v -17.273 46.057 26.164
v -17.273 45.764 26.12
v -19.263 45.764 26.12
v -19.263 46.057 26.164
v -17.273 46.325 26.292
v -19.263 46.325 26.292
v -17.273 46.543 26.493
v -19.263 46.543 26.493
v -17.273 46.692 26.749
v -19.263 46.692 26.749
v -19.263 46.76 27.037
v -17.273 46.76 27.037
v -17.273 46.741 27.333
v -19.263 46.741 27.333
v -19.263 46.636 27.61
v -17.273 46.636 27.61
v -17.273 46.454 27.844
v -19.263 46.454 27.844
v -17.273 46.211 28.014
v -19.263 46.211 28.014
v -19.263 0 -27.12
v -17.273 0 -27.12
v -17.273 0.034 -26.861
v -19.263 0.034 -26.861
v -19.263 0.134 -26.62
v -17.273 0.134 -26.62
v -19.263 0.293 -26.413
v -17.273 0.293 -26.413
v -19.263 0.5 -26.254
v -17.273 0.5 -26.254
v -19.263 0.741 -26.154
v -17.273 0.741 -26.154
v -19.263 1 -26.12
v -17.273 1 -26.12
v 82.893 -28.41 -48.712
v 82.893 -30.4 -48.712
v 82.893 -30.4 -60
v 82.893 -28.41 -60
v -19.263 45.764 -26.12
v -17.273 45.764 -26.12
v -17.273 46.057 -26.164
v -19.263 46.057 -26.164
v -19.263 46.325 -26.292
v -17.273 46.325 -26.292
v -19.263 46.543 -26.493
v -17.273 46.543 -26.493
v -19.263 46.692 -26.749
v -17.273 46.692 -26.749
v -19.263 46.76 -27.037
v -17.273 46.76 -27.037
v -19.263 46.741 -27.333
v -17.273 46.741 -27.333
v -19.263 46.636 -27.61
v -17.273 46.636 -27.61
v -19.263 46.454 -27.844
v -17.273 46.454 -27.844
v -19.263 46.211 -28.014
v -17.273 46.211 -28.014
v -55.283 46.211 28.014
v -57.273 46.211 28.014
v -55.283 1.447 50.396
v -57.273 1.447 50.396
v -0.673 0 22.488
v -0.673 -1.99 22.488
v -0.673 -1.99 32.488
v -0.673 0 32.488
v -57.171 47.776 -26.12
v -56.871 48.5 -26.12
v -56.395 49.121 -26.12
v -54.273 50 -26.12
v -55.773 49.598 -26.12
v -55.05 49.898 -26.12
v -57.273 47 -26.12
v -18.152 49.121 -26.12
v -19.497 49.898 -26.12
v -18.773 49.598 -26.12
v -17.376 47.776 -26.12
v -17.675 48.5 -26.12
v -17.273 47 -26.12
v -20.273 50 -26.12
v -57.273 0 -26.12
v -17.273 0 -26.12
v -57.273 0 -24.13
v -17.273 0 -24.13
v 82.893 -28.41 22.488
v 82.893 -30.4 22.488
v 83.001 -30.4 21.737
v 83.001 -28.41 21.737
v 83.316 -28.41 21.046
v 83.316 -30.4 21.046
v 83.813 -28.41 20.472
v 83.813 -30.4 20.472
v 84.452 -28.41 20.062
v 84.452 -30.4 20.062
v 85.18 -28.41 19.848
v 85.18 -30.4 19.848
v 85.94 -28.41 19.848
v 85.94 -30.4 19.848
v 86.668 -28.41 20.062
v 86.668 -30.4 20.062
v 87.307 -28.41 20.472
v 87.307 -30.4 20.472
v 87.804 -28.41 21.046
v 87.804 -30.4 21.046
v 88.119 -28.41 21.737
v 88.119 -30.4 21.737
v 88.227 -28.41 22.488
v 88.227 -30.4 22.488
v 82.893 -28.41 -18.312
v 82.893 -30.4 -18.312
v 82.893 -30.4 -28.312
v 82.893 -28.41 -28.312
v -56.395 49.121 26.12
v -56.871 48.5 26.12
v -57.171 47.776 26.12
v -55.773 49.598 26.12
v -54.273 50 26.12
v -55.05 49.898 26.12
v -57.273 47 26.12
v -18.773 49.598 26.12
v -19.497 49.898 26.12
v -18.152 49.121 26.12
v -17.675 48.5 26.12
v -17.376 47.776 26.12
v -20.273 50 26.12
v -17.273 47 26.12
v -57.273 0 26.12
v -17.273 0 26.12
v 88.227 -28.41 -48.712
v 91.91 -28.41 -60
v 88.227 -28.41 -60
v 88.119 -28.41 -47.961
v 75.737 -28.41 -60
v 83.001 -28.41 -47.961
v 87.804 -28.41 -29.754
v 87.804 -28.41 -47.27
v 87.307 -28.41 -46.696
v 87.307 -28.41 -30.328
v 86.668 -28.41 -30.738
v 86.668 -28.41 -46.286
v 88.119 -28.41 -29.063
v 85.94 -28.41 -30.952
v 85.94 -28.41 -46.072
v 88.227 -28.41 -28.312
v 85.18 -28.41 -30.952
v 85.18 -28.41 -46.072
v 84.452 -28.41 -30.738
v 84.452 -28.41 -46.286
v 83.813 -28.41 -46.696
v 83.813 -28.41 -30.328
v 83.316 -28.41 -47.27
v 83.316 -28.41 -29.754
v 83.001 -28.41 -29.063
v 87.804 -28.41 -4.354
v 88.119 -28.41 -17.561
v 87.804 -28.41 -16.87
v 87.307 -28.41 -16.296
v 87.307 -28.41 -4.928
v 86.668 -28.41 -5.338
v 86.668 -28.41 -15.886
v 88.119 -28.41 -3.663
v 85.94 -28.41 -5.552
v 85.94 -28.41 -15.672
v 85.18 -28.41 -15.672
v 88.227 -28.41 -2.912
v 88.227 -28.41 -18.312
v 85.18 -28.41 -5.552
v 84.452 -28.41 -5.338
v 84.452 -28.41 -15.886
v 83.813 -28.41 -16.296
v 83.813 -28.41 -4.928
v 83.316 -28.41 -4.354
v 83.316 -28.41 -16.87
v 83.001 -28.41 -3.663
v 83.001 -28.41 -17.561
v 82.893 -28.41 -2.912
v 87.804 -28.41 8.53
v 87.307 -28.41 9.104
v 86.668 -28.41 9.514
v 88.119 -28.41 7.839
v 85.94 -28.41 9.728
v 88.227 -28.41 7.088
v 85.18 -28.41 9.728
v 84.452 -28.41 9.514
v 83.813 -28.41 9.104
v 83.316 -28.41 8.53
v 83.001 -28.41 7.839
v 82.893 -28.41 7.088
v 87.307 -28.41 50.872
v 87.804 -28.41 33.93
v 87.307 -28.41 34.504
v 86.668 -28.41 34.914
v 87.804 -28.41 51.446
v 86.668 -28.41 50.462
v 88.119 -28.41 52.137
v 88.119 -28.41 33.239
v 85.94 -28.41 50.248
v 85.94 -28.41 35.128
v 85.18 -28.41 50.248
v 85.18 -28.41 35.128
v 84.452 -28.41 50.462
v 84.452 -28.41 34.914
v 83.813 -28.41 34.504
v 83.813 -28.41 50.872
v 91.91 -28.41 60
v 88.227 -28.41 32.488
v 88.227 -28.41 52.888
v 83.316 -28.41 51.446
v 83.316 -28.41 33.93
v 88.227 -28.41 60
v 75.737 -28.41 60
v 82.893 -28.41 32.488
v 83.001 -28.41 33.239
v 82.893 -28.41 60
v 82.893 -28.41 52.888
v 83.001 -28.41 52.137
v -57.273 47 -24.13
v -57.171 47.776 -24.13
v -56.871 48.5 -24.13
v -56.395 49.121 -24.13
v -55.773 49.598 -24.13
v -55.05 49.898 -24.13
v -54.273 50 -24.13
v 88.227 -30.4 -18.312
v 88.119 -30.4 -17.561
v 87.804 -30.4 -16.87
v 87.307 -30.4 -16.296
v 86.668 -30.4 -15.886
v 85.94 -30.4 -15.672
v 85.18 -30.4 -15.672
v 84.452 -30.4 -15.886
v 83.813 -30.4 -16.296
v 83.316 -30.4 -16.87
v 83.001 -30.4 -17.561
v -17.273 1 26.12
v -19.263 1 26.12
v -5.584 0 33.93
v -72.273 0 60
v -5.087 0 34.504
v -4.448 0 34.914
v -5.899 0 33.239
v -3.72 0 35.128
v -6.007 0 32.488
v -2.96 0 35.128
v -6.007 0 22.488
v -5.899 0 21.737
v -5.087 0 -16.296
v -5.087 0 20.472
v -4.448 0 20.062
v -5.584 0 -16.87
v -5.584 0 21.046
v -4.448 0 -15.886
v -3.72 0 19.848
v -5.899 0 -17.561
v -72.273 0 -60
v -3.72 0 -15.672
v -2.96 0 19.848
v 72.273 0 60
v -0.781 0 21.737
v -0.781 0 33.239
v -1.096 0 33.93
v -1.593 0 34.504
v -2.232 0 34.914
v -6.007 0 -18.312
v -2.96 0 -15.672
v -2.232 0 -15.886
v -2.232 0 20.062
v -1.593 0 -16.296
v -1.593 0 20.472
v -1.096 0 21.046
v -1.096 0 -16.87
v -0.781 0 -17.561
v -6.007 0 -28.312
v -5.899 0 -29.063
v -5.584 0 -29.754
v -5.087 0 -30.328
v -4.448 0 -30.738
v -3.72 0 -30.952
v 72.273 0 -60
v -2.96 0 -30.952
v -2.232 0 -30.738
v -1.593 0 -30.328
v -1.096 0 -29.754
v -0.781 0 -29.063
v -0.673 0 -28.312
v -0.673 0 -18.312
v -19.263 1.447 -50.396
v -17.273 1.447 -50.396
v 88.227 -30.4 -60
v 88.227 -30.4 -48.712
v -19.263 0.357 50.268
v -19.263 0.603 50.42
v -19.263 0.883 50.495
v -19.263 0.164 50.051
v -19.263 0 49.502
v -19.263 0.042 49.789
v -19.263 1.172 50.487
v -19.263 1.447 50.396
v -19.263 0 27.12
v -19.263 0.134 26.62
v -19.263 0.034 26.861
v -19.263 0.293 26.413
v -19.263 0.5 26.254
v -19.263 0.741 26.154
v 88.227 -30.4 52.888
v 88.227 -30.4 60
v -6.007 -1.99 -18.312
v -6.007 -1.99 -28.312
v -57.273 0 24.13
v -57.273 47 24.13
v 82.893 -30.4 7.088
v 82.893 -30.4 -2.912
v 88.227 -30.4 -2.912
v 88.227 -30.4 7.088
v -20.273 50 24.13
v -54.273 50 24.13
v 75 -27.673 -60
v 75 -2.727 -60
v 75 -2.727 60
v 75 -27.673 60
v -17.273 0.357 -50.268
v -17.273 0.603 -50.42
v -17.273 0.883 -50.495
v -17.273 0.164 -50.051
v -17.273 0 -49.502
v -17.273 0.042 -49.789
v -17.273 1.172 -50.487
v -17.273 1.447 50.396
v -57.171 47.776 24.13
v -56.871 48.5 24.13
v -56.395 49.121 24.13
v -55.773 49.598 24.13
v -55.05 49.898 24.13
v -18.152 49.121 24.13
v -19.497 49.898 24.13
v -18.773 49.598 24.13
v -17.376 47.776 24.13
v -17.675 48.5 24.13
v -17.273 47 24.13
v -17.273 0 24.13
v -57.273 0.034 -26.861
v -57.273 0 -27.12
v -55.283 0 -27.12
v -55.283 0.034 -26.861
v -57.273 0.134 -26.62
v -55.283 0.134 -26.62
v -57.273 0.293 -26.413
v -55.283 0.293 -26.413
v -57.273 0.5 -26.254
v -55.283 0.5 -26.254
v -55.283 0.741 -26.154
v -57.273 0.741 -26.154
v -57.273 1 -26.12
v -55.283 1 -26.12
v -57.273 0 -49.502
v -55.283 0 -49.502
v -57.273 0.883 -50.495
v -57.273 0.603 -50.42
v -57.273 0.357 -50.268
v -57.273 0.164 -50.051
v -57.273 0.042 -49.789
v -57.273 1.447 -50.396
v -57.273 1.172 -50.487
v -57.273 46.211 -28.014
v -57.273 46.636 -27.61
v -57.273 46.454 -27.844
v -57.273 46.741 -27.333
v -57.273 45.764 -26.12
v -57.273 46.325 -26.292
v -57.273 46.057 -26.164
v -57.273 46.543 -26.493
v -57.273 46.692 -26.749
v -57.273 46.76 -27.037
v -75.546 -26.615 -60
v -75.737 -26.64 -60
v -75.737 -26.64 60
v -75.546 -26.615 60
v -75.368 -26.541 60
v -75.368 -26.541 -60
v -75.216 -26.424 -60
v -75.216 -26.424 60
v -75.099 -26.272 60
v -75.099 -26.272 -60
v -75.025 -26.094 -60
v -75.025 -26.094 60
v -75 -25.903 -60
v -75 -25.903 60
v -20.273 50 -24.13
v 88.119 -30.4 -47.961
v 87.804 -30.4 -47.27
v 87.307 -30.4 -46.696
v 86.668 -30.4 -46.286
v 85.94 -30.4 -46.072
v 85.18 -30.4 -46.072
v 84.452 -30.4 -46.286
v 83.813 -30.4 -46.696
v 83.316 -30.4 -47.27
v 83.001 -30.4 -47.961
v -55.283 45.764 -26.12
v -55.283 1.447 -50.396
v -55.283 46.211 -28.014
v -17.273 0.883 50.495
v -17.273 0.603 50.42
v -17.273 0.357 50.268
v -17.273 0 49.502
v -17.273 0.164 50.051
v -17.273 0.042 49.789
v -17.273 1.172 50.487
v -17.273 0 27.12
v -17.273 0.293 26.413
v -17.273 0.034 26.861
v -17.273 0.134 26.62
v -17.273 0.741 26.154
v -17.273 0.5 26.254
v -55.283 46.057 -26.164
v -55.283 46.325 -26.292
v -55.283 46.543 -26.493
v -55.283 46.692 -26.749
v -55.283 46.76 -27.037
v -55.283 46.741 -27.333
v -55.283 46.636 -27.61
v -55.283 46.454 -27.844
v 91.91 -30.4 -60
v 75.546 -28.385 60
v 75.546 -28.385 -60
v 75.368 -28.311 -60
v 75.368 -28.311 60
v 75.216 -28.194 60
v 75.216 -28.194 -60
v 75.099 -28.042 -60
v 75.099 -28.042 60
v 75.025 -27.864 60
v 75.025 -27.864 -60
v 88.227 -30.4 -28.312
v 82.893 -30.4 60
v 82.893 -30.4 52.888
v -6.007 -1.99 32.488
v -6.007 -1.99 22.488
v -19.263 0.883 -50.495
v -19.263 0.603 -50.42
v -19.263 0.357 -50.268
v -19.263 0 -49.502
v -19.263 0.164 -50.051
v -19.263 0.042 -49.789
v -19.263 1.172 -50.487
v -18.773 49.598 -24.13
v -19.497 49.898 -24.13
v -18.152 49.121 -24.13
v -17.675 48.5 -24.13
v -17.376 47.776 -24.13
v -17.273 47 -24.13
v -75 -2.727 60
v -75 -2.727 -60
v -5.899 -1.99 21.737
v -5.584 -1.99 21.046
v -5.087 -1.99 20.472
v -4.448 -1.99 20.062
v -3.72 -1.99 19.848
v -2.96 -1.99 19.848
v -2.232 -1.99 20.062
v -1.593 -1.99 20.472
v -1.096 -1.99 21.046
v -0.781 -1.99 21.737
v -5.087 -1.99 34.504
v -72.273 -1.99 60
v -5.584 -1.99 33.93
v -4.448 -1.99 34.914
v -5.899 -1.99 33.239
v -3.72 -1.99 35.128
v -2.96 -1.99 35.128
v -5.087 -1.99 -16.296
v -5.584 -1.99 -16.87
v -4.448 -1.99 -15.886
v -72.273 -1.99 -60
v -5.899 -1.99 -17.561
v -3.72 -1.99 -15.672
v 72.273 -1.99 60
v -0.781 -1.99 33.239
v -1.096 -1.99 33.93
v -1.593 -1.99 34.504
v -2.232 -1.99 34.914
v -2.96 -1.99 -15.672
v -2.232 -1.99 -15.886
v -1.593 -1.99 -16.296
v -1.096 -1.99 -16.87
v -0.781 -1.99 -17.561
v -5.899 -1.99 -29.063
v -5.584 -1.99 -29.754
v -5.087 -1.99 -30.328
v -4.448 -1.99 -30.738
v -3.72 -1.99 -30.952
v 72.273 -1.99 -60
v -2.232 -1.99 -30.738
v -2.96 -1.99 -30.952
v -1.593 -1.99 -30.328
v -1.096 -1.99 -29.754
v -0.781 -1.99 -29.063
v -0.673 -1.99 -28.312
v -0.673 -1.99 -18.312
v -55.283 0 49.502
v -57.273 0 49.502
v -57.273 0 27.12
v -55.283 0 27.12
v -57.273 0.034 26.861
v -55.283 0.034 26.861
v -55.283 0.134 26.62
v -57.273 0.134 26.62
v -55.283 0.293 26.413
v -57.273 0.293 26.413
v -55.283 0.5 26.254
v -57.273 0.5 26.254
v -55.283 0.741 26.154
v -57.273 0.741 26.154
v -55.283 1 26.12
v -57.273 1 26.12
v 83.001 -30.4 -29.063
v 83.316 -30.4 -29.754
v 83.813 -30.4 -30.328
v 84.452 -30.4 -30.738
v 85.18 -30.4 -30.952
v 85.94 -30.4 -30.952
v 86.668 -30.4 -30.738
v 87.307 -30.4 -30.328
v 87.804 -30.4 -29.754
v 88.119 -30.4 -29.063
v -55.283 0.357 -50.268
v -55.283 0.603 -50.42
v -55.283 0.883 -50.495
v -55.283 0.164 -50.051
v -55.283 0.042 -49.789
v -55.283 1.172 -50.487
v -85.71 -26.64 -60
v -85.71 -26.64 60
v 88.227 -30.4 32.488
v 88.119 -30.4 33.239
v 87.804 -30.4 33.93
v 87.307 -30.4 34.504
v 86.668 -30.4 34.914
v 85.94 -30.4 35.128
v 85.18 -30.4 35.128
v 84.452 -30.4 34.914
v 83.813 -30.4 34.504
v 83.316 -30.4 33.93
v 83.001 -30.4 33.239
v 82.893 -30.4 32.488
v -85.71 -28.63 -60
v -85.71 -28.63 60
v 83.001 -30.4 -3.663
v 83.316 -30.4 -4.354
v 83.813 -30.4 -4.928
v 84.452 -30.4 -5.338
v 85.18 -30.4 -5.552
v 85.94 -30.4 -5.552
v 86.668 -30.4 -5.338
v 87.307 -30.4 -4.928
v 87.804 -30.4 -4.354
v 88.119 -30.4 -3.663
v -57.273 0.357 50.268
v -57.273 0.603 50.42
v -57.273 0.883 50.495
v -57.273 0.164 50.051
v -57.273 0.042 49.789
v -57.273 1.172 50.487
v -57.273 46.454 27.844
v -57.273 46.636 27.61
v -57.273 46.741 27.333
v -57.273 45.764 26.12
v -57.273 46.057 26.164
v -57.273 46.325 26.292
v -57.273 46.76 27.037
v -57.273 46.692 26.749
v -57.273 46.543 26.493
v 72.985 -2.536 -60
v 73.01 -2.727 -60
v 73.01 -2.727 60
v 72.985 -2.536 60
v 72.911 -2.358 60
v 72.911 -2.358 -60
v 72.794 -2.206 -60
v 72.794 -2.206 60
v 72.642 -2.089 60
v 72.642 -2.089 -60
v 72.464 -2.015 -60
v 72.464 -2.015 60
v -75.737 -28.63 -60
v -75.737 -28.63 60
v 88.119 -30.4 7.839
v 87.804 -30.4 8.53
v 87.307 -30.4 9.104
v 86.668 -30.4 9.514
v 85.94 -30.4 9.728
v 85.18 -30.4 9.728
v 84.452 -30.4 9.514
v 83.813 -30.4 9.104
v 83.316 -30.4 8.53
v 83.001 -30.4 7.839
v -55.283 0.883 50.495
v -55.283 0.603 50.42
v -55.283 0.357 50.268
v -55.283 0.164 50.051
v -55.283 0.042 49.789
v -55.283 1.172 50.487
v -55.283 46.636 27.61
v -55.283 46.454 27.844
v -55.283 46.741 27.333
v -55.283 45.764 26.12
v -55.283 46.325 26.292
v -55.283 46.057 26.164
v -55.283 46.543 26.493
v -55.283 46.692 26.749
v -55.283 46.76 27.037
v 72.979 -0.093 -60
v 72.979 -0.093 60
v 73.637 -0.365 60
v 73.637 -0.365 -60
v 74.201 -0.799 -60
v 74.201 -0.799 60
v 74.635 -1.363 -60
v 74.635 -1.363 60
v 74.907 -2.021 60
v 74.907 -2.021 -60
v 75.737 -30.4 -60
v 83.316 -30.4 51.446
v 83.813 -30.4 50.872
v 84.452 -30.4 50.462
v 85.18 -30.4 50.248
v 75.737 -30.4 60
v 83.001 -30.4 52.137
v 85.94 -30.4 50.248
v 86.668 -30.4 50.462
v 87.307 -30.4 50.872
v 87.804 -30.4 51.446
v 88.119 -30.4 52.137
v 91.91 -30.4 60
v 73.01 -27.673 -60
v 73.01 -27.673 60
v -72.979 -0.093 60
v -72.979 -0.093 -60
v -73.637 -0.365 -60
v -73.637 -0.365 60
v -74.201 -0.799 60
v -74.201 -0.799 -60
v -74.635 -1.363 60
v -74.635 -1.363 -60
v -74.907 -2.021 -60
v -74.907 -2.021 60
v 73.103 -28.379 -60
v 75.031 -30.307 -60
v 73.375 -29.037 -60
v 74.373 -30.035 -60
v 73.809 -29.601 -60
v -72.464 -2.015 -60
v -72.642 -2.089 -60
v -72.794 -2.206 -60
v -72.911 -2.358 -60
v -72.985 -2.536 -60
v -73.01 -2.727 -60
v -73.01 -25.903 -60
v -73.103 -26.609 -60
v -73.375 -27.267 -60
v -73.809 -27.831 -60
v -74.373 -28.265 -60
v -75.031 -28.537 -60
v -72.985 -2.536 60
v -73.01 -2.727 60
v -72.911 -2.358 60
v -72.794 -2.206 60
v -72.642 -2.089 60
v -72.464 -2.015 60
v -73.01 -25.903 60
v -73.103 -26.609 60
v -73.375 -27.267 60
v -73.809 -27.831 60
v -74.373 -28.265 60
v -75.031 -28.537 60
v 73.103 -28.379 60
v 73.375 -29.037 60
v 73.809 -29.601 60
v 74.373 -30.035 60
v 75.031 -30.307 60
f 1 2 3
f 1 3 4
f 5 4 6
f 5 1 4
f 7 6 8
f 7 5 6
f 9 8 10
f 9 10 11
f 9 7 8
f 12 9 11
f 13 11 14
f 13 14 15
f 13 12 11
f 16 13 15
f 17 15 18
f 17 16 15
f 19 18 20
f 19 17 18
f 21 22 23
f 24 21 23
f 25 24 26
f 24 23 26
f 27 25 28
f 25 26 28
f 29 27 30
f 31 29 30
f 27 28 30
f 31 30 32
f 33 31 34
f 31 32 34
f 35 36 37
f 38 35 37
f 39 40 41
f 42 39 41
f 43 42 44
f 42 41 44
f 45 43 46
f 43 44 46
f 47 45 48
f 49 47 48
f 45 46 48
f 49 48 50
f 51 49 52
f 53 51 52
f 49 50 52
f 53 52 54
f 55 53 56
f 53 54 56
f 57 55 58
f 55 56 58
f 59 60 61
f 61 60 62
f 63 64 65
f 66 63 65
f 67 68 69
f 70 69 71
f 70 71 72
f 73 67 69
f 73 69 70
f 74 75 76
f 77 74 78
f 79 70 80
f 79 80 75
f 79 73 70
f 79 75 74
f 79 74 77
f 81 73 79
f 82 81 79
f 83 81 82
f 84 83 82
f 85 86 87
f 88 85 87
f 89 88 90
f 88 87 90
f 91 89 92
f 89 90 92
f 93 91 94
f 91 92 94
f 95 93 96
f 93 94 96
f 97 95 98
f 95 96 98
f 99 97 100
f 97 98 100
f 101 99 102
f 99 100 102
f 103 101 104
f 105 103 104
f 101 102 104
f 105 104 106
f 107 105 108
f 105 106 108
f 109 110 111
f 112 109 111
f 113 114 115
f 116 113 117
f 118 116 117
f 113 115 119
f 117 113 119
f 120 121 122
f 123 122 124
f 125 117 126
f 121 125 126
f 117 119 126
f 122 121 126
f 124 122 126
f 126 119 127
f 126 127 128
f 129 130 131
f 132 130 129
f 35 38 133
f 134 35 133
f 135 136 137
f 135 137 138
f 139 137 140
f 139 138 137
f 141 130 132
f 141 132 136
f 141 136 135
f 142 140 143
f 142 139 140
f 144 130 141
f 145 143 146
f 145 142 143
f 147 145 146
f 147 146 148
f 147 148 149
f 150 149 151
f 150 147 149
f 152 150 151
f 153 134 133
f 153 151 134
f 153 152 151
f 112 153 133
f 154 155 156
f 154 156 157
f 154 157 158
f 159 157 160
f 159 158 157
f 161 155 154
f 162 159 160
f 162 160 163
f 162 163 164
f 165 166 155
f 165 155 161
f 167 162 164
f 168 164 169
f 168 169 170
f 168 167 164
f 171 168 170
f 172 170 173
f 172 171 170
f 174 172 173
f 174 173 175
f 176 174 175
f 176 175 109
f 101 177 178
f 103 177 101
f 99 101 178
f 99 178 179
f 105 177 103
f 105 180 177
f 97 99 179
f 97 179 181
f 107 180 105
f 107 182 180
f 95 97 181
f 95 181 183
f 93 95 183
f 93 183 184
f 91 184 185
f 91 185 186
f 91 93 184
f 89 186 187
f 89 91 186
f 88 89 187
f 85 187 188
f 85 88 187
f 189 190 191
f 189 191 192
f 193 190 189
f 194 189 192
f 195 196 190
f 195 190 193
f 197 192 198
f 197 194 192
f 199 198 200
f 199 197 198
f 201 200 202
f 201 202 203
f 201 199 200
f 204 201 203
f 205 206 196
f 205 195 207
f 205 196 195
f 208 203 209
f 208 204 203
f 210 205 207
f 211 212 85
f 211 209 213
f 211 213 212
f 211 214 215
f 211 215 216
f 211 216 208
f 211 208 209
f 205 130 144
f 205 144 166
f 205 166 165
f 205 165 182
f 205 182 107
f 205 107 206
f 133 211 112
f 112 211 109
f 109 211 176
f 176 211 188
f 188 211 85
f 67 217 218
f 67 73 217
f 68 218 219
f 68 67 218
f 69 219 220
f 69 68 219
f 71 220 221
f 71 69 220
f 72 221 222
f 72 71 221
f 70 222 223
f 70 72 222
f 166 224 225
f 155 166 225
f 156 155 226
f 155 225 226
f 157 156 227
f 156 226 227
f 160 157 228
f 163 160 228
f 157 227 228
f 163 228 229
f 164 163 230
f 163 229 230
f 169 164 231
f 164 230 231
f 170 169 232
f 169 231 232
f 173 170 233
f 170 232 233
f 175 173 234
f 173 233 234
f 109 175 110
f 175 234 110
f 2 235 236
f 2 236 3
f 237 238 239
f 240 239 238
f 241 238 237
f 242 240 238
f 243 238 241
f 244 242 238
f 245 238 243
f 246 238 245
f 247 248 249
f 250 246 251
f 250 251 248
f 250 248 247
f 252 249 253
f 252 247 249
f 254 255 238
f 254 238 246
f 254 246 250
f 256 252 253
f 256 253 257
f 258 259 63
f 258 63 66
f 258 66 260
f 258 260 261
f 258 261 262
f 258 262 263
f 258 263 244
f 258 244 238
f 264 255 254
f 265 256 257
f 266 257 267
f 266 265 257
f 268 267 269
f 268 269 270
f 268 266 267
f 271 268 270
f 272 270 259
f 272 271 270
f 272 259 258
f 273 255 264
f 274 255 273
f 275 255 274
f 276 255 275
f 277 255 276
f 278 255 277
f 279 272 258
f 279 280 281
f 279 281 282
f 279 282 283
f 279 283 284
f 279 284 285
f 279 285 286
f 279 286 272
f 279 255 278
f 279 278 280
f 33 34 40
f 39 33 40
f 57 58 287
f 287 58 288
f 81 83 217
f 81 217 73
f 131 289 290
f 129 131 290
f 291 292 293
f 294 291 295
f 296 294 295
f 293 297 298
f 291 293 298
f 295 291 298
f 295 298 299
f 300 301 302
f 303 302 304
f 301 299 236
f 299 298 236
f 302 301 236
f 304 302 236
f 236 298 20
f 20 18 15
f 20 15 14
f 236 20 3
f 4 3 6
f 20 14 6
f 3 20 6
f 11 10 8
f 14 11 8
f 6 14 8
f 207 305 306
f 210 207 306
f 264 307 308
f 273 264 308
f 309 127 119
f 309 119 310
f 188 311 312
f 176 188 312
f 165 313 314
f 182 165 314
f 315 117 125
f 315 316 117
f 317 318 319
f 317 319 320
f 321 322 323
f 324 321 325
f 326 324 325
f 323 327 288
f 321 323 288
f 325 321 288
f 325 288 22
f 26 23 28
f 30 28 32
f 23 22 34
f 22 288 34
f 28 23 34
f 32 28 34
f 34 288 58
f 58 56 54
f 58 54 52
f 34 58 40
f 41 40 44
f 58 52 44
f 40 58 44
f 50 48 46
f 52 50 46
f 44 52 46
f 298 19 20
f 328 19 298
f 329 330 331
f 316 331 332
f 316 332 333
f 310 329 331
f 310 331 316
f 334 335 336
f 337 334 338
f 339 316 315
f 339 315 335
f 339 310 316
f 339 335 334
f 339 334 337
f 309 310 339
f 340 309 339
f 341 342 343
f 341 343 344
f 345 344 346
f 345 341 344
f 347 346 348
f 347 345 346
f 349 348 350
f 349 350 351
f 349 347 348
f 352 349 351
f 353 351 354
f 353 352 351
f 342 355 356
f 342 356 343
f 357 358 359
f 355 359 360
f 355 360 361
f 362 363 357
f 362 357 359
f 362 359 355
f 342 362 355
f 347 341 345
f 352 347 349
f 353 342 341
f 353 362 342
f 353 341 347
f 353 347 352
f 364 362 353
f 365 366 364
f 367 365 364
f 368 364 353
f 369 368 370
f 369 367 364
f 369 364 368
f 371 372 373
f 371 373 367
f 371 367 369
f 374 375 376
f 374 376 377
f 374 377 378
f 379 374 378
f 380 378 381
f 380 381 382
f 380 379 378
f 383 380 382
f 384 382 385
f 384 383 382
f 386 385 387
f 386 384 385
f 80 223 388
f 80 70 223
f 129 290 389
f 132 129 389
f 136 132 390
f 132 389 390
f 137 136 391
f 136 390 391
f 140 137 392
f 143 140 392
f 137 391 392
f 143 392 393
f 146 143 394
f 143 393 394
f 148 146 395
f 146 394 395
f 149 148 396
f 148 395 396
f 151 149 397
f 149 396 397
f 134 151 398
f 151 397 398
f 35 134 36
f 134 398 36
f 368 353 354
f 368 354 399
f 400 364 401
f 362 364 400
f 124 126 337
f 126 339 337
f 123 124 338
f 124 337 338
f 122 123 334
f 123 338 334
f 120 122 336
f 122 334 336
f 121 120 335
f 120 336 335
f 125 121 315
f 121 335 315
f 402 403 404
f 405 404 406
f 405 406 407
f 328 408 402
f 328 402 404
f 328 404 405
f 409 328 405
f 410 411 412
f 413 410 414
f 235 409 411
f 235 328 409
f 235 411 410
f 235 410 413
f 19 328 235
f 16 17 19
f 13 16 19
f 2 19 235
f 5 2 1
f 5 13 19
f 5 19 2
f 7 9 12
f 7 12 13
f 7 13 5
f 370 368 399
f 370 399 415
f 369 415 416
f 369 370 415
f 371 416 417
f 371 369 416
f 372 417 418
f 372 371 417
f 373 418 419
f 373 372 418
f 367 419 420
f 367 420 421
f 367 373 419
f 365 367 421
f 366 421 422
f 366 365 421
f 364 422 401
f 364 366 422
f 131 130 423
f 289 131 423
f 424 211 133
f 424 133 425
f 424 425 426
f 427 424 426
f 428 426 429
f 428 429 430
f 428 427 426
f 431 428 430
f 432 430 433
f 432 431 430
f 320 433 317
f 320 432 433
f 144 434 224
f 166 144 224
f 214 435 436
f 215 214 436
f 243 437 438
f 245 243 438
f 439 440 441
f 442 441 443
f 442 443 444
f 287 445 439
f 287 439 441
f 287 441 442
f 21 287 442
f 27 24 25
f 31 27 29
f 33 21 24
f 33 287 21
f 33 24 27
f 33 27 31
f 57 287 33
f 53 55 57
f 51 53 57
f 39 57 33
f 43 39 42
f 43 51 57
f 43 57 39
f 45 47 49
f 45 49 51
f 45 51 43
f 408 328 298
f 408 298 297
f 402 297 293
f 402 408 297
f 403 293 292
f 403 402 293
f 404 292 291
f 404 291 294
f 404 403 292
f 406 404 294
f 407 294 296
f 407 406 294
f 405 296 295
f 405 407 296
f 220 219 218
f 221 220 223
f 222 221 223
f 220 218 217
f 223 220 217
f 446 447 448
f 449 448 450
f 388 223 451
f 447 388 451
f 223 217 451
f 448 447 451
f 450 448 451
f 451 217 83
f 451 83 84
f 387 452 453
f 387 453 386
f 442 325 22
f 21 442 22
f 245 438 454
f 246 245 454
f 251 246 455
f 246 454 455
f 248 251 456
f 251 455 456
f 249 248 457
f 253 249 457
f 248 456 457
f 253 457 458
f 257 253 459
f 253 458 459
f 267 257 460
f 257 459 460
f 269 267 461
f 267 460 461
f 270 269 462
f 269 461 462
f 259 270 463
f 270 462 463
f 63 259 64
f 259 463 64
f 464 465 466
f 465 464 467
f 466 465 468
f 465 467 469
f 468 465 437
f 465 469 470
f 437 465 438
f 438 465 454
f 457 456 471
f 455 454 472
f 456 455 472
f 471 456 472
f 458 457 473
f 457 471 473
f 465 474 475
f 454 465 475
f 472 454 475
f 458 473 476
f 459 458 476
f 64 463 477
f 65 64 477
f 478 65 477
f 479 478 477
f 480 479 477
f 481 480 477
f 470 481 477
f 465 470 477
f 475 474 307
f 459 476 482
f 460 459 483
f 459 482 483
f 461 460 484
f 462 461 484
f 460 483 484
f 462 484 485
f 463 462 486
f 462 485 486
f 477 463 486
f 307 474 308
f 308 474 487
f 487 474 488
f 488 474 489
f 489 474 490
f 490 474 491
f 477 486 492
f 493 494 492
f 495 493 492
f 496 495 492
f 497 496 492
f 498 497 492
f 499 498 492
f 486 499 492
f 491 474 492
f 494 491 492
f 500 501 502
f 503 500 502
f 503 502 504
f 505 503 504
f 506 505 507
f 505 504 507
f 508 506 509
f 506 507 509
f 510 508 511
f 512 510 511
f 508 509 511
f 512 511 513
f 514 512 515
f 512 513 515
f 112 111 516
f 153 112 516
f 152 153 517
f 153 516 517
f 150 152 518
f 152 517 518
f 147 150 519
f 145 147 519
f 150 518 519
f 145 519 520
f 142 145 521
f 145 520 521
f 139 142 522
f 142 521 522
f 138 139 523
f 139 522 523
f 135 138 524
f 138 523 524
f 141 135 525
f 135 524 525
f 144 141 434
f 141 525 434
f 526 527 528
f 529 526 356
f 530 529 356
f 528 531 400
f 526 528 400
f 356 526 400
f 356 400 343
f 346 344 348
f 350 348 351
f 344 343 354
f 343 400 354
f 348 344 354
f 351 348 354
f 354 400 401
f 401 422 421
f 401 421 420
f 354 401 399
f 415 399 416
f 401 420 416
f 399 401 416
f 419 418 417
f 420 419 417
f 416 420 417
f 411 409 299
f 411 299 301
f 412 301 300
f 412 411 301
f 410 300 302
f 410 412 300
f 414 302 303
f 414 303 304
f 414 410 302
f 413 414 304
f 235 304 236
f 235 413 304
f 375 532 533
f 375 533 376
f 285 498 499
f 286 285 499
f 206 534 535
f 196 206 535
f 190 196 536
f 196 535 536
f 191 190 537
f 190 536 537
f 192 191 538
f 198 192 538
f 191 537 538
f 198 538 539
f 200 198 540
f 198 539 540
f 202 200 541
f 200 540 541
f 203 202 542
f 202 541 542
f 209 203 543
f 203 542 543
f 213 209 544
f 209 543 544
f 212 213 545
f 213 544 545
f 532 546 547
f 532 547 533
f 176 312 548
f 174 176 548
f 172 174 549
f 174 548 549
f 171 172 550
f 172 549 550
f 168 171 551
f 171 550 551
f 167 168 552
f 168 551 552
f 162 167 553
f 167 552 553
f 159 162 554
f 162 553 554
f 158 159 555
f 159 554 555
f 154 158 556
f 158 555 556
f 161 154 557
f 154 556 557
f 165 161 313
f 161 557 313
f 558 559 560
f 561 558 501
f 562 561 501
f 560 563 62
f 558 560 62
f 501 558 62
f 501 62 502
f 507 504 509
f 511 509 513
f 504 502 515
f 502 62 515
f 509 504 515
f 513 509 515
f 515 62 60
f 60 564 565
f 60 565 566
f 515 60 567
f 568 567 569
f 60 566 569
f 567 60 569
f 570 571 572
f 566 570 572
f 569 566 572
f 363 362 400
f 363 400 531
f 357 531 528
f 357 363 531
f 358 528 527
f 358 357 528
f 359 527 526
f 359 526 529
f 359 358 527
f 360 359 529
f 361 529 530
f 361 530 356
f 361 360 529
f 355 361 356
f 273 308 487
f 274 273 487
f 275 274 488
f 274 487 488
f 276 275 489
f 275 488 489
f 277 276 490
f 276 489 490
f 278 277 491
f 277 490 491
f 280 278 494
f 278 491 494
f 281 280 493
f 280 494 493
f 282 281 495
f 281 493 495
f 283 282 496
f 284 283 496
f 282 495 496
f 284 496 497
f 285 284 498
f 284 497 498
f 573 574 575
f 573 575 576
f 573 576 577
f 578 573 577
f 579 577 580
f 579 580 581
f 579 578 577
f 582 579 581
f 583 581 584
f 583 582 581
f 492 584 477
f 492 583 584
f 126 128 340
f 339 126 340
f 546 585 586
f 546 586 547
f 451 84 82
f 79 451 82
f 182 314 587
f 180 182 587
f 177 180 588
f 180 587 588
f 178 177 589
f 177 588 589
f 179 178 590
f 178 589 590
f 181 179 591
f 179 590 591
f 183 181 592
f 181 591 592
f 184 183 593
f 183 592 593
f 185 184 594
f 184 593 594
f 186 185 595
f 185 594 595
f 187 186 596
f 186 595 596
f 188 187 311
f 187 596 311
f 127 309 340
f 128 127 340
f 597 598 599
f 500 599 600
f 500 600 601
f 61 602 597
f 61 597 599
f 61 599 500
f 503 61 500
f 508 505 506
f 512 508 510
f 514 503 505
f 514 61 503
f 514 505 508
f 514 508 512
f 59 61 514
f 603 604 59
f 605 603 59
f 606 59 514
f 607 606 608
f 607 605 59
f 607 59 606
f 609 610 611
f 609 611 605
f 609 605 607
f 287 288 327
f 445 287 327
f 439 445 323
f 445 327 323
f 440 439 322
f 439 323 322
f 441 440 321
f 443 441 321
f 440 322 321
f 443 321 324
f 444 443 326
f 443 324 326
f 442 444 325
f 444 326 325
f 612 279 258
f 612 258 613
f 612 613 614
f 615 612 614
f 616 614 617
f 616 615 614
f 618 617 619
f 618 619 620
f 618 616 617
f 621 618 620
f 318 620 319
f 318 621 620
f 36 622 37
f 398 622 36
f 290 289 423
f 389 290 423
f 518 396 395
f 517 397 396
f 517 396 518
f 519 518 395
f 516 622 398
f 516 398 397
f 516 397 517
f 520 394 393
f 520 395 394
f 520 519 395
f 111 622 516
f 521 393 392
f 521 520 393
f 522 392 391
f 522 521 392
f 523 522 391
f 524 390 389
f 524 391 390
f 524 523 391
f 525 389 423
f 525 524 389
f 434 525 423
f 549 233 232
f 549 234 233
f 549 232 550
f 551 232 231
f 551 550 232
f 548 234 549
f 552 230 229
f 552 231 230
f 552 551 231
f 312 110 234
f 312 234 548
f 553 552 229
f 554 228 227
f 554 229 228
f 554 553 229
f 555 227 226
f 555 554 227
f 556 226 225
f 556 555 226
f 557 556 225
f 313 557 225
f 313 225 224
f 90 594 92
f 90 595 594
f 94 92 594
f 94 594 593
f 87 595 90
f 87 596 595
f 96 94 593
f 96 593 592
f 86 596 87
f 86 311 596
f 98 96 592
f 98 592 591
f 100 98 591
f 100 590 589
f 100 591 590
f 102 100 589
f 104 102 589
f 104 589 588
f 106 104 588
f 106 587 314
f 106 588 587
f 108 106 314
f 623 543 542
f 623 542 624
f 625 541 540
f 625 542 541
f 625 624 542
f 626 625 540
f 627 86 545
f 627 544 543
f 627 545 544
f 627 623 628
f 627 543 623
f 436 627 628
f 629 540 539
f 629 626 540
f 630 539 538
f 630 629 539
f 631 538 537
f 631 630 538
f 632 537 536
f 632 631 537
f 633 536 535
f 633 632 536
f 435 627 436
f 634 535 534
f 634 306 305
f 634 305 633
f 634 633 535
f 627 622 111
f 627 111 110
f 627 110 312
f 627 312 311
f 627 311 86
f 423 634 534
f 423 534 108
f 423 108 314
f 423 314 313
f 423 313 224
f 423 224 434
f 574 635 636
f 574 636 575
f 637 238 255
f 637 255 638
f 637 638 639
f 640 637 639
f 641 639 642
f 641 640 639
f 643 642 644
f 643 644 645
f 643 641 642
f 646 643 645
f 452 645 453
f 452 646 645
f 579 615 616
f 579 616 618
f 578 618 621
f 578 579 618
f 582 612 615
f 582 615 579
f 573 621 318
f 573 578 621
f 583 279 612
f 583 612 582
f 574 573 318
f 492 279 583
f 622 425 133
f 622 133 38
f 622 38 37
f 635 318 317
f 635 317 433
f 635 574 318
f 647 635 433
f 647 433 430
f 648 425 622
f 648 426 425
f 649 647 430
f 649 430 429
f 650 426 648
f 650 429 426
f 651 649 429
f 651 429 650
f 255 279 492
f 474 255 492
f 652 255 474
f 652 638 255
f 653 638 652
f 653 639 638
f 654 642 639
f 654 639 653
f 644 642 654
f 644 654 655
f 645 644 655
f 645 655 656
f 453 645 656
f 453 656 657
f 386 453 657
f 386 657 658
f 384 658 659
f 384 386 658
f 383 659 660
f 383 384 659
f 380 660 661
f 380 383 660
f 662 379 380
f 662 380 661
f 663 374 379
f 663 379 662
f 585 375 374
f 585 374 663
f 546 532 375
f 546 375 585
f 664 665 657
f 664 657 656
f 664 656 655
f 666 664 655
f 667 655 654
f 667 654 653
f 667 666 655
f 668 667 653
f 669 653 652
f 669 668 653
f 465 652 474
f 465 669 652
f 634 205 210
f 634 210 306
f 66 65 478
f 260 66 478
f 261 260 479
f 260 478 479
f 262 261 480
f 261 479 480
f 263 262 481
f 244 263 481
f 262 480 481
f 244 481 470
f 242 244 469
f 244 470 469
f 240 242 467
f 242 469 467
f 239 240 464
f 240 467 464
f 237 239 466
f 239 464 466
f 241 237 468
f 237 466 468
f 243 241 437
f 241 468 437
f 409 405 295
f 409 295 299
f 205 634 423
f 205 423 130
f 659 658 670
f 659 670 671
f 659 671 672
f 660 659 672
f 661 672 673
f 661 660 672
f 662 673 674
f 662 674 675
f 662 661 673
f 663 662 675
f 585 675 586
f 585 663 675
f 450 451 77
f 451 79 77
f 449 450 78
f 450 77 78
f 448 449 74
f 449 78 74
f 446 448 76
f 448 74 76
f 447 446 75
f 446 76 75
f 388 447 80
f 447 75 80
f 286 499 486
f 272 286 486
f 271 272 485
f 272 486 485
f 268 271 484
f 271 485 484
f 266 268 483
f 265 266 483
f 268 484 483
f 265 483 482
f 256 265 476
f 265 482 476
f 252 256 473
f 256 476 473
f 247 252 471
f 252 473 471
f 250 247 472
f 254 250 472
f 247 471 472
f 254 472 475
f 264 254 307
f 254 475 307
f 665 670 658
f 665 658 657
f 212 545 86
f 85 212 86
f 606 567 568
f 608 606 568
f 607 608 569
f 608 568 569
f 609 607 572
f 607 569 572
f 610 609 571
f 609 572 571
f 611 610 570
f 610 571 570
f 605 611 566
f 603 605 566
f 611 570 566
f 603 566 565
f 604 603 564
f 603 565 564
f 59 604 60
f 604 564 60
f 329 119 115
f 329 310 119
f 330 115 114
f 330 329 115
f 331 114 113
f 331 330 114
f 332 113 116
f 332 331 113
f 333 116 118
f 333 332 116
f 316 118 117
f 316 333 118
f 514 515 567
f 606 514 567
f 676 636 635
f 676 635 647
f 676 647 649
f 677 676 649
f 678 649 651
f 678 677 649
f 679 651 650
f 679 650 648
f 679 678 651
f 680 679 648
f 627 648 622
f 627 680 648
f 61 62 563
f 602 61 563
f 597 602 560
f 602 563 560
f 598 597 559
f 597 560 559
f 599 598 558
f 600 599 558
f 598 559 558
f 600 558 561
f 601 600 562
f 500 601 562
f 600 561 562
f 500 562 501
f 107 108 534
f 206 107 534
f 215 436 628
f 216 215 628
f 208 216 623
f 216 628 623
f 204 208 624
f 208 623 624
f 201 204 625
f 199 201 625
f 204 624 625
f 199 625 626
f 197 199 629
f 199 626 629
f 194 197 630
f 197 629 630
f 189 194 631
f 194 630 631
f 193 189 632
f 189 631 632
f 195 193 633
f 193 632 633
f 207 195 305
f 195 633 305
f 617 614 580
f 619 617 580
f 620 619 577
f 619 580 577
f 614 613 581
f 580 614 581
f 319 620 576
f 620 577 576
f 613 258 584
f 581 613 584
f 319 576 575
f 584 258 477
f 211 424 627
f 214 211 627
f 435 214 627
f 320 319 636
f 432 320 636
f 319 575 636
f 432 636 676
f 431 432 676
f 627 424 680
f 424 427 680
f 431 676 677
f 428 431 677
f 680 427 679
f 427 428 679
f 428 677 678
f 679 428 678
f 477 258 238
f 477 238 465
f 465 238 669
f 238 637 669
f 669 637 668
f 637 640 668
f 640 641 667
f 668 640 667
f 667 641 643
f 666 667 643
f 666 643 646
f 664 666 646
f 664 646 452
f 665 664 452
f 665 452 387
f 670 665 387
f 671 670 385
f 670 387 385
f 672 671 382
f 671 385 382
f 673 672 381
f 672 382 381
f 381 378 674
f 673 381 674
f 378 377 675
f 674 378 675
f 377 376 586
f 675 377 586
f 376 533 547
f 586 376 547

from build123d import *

# Parameters (mm, degrees)
SKETCH1_W                    = 150
SKETCH1_H                    = 120
BASE_FLANGE1_DEPTH           = 1.99
EDGE_FLANGE1_STRIP_W         = 9.4332
EDGE_FLANGE1_STRIP_H         = 1.99
EDGE_FLANGE1_STRIP_CUT_DEPTH = 120
EDGE_FLANGE1_DEPTH           = 120
EDGE_FLANGE2_STRIP_W         = 9.4332
EDGE_FLANGE2_STRIP_H         = 1.99
EDGE_FLANGE2_STRIP_CUT_DEPTH = 120
EDGE_FLANGE2_DEPTH           = 120
EDGE_FLANGE3_STRIP_W         = 9.4332
EDGE_FLANGE3_STRIP_H         = 1.99
EDGE_FLANGE3_STRIP_CUT_DEPTH = 120
EDGE_FLANGE3_DEPTH           = 120
EDGE_FLANGE4_STRIP_W         = 9.4332
EDGE_FLANGE4_STRIP_H         = 1.99
EDGE_FLANGE4_STRIP_CUT_DEPTH = 120
EDGE_FLANGE4_DEPTH           = 120
CUT_EXTRUDE1_DEPTH           = 114.892967737
SKETCH22_W                   = 40
SKETCH22_H                   = 1.99
BOSS_EXTRUDE1_DEPTH          = 50
BOSS_EXTRUDE1_2_DEPTH        = 50
BOSS_EXTRUDE2_START          = -17.2734
BOSS_EXTRUDE2_DEPTH          = 1.99
BOSS_EXTRUDE2_2_DEPTH        = 1.99
BOSS_EXTRUDE3_START          = -57.2734
BOSS_EXTRUDE3_DEPTH          = 1.99
BOSS_EXTRUDE3_2_DEPTH        = 1.99
FILLET1_R                    = 3
FILLET2_R                    = 3


# Sheet-metal steps are written as plain solids
with BuildPart() as part:
    # Sketch1 → Base-Flange1 (new body)
    with BuildSketch(Plane(origin=(0, 0, 0), x_dir=(1, 0, 0), z_dir=(0, 1, 0))):
        Rectangle(SKETCH1_W, SKETCH1_H)
    extrude(amount=-BASE_FLANGE1_DEPTH)

    # Edge-Flange1 strip (across the edge) → Edge-Flange1 strip cut (cut)
    with BuildSketch(Plane(origin=(75, -1.99, -60), x_dir=(-1, 0, 0), z_dir=(0, 0, 1))):
        with Locations((-1.99, -0.995)):
            Rectangle(EDGE_FLANGE1_STRIP_W, EDGE_FLANGE1_STRIP_H)
    extrude(amount=EDGE_FLANGE1_STRIP_CUT_DEPTH, mode=Mode.SUBTRACT)

    # Edge-Flange1 section (across the edge) → Edge-Flange1 (add)
    with BuildSketch(Plane(origin=(75, -1.99, -60), x_dir=(-1, 0, 0), z_dir=(0, 0, 1))):
        with BuildLine():
            Line((0, 0.7366), (0, 28.41))
            Line((0, 28.41), (1.99, 28.41))
            Line((1.99, 28.41), (1.99, 0.7366))
            ThreePointArc((1.99, 0.7366), (2.205745145, 0.215745145), (2.7266, 0))
            Line((2.7266, 0), (2.7266, -1.99))
            ThreePointArc((2.7266, -1.99), (0.79860265, -1.19139735), (0, 0.7366))
        make_face()
    extrude(amount=EDGE_FLANGE1_DEPTH)

    # Edge-Flange2 strip (across the edge) → Edge-Flange2 strip cut (cut)
    with BuildSketch(Plane(origin=(75, -30.4, 60), x_dir=(0, 1, 0), z_dir=(0, 0, -1))):
        with Locations((-1.99, -0.995)):
            Rectangle(EDGE_FLANGE2_STRIP_W, EDGE_FLANGE2_STRIP_H)
    extrude(amount=EDGE_FLANGE2_STRIP_CUT_DEPTH, mode=Mode.SUBTRACT)

    # Edge-Flange2 section (across the edge) → Edge-Flange2 (add)
    with BuildSketch(Plane(origin=(75, -30.4, 60), x_dir=(0, 1, 0), z_dir=(0, 0, -1))):
        with BuildLine():
            Line((0, 0.7366), (0, 16.91))
            Line((0, 16.91), (1.99, 16.91))
            Line((1.99, 16.91), (1.99, 0.7366))
            ThreePointArc((1.99, 0.7366), (2.205745145, 0.215745145), (2.7266, 0))
            Line((2.7266, 0), (2.7266, -1.99))
            ThreePointArc((2.7266, -1.99), (0.79860265, -1.19139735), (0, 0.7366))
        make_face()
    extrude(amount=EDGE_FLANGE2_DEPTH)

    # Edge-Flange3 strip (across the edge) → Edge-Flange3 strip cut (cut)
    with BuildSketch(Plane(origin=(-75, -1.99, 60), x_dir=(1, 0, 0), z_dir=(0, 0, -1))):
        with Locations((-1.99, -0.995)):
            Rectangle(EDGE_FLANGE3_STRIP_W, EDGE_FLANGE3_STRIP_H)
    extrude(amount=EDGE_FLANGE3_STRIP_CUT_DEPTH, mode=Mode.SUBTRACT)

    # Edge-Flange3 section (across the edge) → Edge-Flange3 (add)
    with BuildSketch(Plane(origin=(-75, -1.99, 60), x_dir=(1, 0, 0), z_dir=(0, 0, -1))):
        with BuildLine():
            Line((0, 0.7366), (0, 26.64))
            Line((0, 26.64), (1.99, 26.64))
            Line((1.99, 26.64), (1.99, 0.7366))
            ThreePointArc((1.99, 0.7366), (2.205745145, 0.215745145), (2.7266, 0))
            Line((2.7266, 0), (2.7266, -1.99))
            ThreePointArc((2.7266, -1.99), (0.79860265, -1.19139735), (0, 0.7366))
        make_face()
    extrude(amount=EDGE_FLANGE3_DEPTH)

    # Edge-Flange4 strip (across the edge) → Edge-Flange4 strip cut (cut)
    with BuildSketch(Plane(origin=(-75, -28.63, -60), x_dir=(0, 1, 0), z_dir=(0, 0, 1))):
        with Locations((-1.99, -0.995)):
            Rectangle(EDGE_FLANGE4_STRIP_W, EDGE_FLANGE4_STRIP_H)
    extrude(amount=EDGE_FLANGE4_STRIP_CUT_DEPTH, mode=Mode.SUBTRACT)

    # Edge-Flange4 section (across the edge) → Edge-Flange4 (add)
    with BuildSketch(Plane(origin=(-75, -28.63, -60), x_dir=(0, 1, 0), z_dir=(0, 0, 1))):
        with BuildLine():
            Line((0, 0.7366), (0, 10.71))
            Line((0, 10.71), (1.99, 10.71))
            Line((1.99, 10.71), (1.99, 0.7366))
            ThreePointArc((1.99, 0.7366), (2.205745145, 0.215745145), (2.7266, 0))
            Line((2.7266, 0), (2.7266, -1.99))
            ThreePointArc((2.7266, -1.99), (0.79860265, -1.19139735), (0, 0.7366))
        make_face()
    extrude(amount=EDGE_FLANGE4_DEPTH)

    # Sketch20 → Cut-Extrude1 (cut, through all)
    with BuildSketch(Plane(origin=(0, -30.4, 0), x_dir=(-1, 0, 0), z_dir=(0, -1, 0))):
        with BuildLine():
            Line((6.007, -32.488), (6.007, -22.488))
            ThreePointArc((6.007, -22.488), (3.34, -19.821), (0.673, -22.488))
            Line((0.673, -22.488), (0.673, -32.488))
            ThreePointArc((0.673, -32.488), (3.34, -35.155), (6.007, -32.488))
        make_face()
        with BuildLine():
            Line((-82.893, -60), (-82.893, -52.888))
            ThreePointArc((-82.893, -52.888), (-85.56, -50.221), (-88.227, -52.888))
            Line((-88.227, -52.888), (-88.227, -60))
            Line((-88.227, -60), (-82.893, -60))
        make_face()
        with BuildLine():
            Line((-82.893, -7.088), (-82.893, 2.912))
            ThreePointArc((-82.893, 2.912), (-85.56, 5.579), (-88.227, 2.912))
            Line((-88.227, 2.912), (-88.227, -7.088))
            ThreePointArc((-88.227, -7.088), (-85.56, -9.755), (-82.893, -7.088))
        make_face()
        with BuildLine():
            Line((-82.893, 18.312), (-82.893, 28.312))
            ThreePointArc((-82.893, 28.312), (-85.56, 30.979), (-88.227, 28.312))
            Line((-88.227, 28.312), (-88.227, 18.312))
            ThreePointArc((-88.227, 18.312), (-85.56, 15.645), (-82.893, 18.312))
        make_face()
        with BuildLine():
            Line((-88.227, 60), (-88.227, 48.712))
            ThreePointArc((-88.227, 48.712), (-85.56, 46.045), (-82.893, 48.712))
            Line((-82.893, 48.712), (-82.893, 60))
            Line((-82.893, 60), (-88.227, 60))
        make_face()
        with BuildLine():
            ThreePointArc((6.007, 28.312), (3.34, 30.979), (0.673, 28.312))
            Line((0.673, 28.312), (0.673, 18.312))
            ThreePointArc((0.673, 18.312), (3.34, 15.645), (6.007, 18.312))
            Line((6.007, 18.312), (6.007, 28.312))
        make_face()
        with BuildLine():
            Line((-82.893, -32.488), (-82.893, -22.488))
            ThreePointArc((-82.893, -22.488), (-85.56, -19.821), (-88.227, -22.488))
            Line((-88.227, -22.488), (-88.227, -32.488))
            ThreePointArc((-88.227, -32.488), (-85.56, -35.155), (-82.893, -32.488))
        make_face()
    extrude(amount=-CUT_EXTRUDE1_DEPTH, mode=Mode.SUBTRACT)


with BuildPart() as body_2:
    # Sketch22 → Boss-Extrude1 (new body)
    with BuildSketch(Plane(origin=(0, 0, 0), x_dir=(1, 0, 0), z_dir=(0, 1, 0))):
        with Locations((-37.2734, 25.125)):
            Rectangle(SKETCH22_W, SKETCH22_H)
    extrude(amount=BOSS_EXTRUDE1_DEPTH)

    # Fillet2
    fillet2_edges = [body_2.edges().sort_by_distance(p)[0] for p in [
        (-57.2734, 50, -25.125),
        (-17.2734, 50, -25.125),
    ]]
    fillet(fillet2_edges, radius=FILLET2_R)


with BuildPart() as body_3:
    # Sketch22 → Boss-Extrude1 2 (new body)
    with BuildSketch(Plane(origin=(0, 0, 0), x_dir=(1, 0, 0), z_dir=(0, 1, 0))):
        with Locations((-37.2734, -25.125)):
            Rectangle(SKETCH22_W, SKETCH22_H)
    extrude(amount=BOSS_EXTRUDE1_2_DEPTH)

    # Fillet1
    fillet1_edges = [body_3.edges().sort_by_distance(p)[0] for p in [
        (-57.2734, 50, 25.125),
        (-17.2734, 50, 25.125),
    ]]
    fillet(fillet1_edges, radius=FILLET1_R)


with BuildPart() as body_4:
    # Sketch27 → Boss-Extrude2 (new body)
    with BuildSketch(Plane(origin=(0, 0, 0), x_dir=(0, 0, -1), z_dir=(1, 0, 0)).offset(BOSS_EXTRUDE2_START)):
        with BuildLine():
            Line((-28.014427191, 46.211145618), (-50.396393202, 1.447213595))
            ThreePointArc((-50.396393202, 1.447213595), (-50.35261682, 0.474268888), (-49.501966011, 0))
            Line((-49.501966011, 0), (-27.12, 0))
            ThreePointArc((-27.12, 0), (-26.412893219, 0.292893219), (-26.12, 1))
            Line((-26.12, 1), (-26.12, 45.763932023))
            ThreePointArc((-26.12, 45.763932023), (-26.890247079, 46.737181012), (-28.014427191, 46.211145618))
        make_face()
    extrude(amount=-BOSS_EXTRUDE2_DEPTH)


with BuildPart() as body_5:
    # Sketch27 → Boss-Extrude2 2 (new body)
    with BuildSketch(Plane(origin=(0, 0, 0), x_dir=(0, 0, -1), z_dir=(1, 0, 0)).offset(BOSS_EXTRUDE2_START)):
        with BuildLine():
            Line((49.501966011, 0), (27.12, 0))
            ThreePointArc((27.12, 0), (26.412893219, 0.292893219), (26.12, 1))
            Line((26.12, 1), (26.12, 45.763932023))
            ThreePointArc((26.12, 45.763932023), (26.890247079, 46.737181012), (28.014427191, 46.211145618))
            Line((28.014427191, 46.211145618), (50.396393202, 1.447213595))
            ThreePointArc((50.396393202, 1.447213595), (50.35261682, 0.474268888), (49.501966011, 0))
        make_face()
    extrude(amount=-BOSS_EXTRUDE2_2_DEPTH)


with BuildPart() as body_6:
    # Sketch27<2> → Boss-Extrude3 (new body)
    with BuildSketch(Plane(origin=(0, 0, 0), x_dir=(0, 0, -1), z_dir=(1, 0, 0)).offset(BOSS_EXTRUDE3_START)):
        with BuildLine():
            Line((-28.014427191, 46.211145618), (-50.396393202, 1.447213595))
            ThreePointArc((-50.396393202, 1.447213595), (-50.35261682, 0.474268888), (-49.501966011, 0))
            Line((-49.501966011, 0), (-27.12, 0))
            ThreePointArc((-27.12, 0), (-26.412893219, 0.292893219), (-26.12, 1))
            Line((-26.12, 1), (-26.12, 45.763932023))
            ThreePointArc((-26.12, 45.763932023), (-26.890247079, 46.737181012), (-28.014427191, 46.211145618))
        make_face()
    extrude(amount=BOSS_EXTRUDE3_DEPTH)


with BuildPart() as body_7:
    # Sketch27<2> → Boss-Extrude3 2 (new body)
    with BuildSketch(Plane(origin=(0, 0, 0), x_dir=(0, 0, -1), z_dir=(1, 0, 0)).offset(BOSS_EXTRUDE3_START)):
        with BuildLine():
            Line((49.501966011, 0), (27.12, 0))
            ThreePointArc((27.12, 0), (26.412893219, 0.292893219), (26.12, 1))
            Line((26.12, 1), (26.12, 45.763932023))
            ThreePointArc((26.12, 45.763932023), (26.890247079, 46.737181012), (28.014427191, 46.211145618))
            Line((28.014427191, 46.211145618), (50.396393202, 1.447213595))
            ThreePointArc((50.396393202, 1.447213595), (50.35261682, 0.474268888), (49.501966011, 0))
        make_face()
    extrude(amount=BOSS_EXTRUDE3_2_DEPTH)


solid = Compound([part.part, body_2.part, body_3.part, body_4.part, body_5.part, body_6.part, body_7.part])
